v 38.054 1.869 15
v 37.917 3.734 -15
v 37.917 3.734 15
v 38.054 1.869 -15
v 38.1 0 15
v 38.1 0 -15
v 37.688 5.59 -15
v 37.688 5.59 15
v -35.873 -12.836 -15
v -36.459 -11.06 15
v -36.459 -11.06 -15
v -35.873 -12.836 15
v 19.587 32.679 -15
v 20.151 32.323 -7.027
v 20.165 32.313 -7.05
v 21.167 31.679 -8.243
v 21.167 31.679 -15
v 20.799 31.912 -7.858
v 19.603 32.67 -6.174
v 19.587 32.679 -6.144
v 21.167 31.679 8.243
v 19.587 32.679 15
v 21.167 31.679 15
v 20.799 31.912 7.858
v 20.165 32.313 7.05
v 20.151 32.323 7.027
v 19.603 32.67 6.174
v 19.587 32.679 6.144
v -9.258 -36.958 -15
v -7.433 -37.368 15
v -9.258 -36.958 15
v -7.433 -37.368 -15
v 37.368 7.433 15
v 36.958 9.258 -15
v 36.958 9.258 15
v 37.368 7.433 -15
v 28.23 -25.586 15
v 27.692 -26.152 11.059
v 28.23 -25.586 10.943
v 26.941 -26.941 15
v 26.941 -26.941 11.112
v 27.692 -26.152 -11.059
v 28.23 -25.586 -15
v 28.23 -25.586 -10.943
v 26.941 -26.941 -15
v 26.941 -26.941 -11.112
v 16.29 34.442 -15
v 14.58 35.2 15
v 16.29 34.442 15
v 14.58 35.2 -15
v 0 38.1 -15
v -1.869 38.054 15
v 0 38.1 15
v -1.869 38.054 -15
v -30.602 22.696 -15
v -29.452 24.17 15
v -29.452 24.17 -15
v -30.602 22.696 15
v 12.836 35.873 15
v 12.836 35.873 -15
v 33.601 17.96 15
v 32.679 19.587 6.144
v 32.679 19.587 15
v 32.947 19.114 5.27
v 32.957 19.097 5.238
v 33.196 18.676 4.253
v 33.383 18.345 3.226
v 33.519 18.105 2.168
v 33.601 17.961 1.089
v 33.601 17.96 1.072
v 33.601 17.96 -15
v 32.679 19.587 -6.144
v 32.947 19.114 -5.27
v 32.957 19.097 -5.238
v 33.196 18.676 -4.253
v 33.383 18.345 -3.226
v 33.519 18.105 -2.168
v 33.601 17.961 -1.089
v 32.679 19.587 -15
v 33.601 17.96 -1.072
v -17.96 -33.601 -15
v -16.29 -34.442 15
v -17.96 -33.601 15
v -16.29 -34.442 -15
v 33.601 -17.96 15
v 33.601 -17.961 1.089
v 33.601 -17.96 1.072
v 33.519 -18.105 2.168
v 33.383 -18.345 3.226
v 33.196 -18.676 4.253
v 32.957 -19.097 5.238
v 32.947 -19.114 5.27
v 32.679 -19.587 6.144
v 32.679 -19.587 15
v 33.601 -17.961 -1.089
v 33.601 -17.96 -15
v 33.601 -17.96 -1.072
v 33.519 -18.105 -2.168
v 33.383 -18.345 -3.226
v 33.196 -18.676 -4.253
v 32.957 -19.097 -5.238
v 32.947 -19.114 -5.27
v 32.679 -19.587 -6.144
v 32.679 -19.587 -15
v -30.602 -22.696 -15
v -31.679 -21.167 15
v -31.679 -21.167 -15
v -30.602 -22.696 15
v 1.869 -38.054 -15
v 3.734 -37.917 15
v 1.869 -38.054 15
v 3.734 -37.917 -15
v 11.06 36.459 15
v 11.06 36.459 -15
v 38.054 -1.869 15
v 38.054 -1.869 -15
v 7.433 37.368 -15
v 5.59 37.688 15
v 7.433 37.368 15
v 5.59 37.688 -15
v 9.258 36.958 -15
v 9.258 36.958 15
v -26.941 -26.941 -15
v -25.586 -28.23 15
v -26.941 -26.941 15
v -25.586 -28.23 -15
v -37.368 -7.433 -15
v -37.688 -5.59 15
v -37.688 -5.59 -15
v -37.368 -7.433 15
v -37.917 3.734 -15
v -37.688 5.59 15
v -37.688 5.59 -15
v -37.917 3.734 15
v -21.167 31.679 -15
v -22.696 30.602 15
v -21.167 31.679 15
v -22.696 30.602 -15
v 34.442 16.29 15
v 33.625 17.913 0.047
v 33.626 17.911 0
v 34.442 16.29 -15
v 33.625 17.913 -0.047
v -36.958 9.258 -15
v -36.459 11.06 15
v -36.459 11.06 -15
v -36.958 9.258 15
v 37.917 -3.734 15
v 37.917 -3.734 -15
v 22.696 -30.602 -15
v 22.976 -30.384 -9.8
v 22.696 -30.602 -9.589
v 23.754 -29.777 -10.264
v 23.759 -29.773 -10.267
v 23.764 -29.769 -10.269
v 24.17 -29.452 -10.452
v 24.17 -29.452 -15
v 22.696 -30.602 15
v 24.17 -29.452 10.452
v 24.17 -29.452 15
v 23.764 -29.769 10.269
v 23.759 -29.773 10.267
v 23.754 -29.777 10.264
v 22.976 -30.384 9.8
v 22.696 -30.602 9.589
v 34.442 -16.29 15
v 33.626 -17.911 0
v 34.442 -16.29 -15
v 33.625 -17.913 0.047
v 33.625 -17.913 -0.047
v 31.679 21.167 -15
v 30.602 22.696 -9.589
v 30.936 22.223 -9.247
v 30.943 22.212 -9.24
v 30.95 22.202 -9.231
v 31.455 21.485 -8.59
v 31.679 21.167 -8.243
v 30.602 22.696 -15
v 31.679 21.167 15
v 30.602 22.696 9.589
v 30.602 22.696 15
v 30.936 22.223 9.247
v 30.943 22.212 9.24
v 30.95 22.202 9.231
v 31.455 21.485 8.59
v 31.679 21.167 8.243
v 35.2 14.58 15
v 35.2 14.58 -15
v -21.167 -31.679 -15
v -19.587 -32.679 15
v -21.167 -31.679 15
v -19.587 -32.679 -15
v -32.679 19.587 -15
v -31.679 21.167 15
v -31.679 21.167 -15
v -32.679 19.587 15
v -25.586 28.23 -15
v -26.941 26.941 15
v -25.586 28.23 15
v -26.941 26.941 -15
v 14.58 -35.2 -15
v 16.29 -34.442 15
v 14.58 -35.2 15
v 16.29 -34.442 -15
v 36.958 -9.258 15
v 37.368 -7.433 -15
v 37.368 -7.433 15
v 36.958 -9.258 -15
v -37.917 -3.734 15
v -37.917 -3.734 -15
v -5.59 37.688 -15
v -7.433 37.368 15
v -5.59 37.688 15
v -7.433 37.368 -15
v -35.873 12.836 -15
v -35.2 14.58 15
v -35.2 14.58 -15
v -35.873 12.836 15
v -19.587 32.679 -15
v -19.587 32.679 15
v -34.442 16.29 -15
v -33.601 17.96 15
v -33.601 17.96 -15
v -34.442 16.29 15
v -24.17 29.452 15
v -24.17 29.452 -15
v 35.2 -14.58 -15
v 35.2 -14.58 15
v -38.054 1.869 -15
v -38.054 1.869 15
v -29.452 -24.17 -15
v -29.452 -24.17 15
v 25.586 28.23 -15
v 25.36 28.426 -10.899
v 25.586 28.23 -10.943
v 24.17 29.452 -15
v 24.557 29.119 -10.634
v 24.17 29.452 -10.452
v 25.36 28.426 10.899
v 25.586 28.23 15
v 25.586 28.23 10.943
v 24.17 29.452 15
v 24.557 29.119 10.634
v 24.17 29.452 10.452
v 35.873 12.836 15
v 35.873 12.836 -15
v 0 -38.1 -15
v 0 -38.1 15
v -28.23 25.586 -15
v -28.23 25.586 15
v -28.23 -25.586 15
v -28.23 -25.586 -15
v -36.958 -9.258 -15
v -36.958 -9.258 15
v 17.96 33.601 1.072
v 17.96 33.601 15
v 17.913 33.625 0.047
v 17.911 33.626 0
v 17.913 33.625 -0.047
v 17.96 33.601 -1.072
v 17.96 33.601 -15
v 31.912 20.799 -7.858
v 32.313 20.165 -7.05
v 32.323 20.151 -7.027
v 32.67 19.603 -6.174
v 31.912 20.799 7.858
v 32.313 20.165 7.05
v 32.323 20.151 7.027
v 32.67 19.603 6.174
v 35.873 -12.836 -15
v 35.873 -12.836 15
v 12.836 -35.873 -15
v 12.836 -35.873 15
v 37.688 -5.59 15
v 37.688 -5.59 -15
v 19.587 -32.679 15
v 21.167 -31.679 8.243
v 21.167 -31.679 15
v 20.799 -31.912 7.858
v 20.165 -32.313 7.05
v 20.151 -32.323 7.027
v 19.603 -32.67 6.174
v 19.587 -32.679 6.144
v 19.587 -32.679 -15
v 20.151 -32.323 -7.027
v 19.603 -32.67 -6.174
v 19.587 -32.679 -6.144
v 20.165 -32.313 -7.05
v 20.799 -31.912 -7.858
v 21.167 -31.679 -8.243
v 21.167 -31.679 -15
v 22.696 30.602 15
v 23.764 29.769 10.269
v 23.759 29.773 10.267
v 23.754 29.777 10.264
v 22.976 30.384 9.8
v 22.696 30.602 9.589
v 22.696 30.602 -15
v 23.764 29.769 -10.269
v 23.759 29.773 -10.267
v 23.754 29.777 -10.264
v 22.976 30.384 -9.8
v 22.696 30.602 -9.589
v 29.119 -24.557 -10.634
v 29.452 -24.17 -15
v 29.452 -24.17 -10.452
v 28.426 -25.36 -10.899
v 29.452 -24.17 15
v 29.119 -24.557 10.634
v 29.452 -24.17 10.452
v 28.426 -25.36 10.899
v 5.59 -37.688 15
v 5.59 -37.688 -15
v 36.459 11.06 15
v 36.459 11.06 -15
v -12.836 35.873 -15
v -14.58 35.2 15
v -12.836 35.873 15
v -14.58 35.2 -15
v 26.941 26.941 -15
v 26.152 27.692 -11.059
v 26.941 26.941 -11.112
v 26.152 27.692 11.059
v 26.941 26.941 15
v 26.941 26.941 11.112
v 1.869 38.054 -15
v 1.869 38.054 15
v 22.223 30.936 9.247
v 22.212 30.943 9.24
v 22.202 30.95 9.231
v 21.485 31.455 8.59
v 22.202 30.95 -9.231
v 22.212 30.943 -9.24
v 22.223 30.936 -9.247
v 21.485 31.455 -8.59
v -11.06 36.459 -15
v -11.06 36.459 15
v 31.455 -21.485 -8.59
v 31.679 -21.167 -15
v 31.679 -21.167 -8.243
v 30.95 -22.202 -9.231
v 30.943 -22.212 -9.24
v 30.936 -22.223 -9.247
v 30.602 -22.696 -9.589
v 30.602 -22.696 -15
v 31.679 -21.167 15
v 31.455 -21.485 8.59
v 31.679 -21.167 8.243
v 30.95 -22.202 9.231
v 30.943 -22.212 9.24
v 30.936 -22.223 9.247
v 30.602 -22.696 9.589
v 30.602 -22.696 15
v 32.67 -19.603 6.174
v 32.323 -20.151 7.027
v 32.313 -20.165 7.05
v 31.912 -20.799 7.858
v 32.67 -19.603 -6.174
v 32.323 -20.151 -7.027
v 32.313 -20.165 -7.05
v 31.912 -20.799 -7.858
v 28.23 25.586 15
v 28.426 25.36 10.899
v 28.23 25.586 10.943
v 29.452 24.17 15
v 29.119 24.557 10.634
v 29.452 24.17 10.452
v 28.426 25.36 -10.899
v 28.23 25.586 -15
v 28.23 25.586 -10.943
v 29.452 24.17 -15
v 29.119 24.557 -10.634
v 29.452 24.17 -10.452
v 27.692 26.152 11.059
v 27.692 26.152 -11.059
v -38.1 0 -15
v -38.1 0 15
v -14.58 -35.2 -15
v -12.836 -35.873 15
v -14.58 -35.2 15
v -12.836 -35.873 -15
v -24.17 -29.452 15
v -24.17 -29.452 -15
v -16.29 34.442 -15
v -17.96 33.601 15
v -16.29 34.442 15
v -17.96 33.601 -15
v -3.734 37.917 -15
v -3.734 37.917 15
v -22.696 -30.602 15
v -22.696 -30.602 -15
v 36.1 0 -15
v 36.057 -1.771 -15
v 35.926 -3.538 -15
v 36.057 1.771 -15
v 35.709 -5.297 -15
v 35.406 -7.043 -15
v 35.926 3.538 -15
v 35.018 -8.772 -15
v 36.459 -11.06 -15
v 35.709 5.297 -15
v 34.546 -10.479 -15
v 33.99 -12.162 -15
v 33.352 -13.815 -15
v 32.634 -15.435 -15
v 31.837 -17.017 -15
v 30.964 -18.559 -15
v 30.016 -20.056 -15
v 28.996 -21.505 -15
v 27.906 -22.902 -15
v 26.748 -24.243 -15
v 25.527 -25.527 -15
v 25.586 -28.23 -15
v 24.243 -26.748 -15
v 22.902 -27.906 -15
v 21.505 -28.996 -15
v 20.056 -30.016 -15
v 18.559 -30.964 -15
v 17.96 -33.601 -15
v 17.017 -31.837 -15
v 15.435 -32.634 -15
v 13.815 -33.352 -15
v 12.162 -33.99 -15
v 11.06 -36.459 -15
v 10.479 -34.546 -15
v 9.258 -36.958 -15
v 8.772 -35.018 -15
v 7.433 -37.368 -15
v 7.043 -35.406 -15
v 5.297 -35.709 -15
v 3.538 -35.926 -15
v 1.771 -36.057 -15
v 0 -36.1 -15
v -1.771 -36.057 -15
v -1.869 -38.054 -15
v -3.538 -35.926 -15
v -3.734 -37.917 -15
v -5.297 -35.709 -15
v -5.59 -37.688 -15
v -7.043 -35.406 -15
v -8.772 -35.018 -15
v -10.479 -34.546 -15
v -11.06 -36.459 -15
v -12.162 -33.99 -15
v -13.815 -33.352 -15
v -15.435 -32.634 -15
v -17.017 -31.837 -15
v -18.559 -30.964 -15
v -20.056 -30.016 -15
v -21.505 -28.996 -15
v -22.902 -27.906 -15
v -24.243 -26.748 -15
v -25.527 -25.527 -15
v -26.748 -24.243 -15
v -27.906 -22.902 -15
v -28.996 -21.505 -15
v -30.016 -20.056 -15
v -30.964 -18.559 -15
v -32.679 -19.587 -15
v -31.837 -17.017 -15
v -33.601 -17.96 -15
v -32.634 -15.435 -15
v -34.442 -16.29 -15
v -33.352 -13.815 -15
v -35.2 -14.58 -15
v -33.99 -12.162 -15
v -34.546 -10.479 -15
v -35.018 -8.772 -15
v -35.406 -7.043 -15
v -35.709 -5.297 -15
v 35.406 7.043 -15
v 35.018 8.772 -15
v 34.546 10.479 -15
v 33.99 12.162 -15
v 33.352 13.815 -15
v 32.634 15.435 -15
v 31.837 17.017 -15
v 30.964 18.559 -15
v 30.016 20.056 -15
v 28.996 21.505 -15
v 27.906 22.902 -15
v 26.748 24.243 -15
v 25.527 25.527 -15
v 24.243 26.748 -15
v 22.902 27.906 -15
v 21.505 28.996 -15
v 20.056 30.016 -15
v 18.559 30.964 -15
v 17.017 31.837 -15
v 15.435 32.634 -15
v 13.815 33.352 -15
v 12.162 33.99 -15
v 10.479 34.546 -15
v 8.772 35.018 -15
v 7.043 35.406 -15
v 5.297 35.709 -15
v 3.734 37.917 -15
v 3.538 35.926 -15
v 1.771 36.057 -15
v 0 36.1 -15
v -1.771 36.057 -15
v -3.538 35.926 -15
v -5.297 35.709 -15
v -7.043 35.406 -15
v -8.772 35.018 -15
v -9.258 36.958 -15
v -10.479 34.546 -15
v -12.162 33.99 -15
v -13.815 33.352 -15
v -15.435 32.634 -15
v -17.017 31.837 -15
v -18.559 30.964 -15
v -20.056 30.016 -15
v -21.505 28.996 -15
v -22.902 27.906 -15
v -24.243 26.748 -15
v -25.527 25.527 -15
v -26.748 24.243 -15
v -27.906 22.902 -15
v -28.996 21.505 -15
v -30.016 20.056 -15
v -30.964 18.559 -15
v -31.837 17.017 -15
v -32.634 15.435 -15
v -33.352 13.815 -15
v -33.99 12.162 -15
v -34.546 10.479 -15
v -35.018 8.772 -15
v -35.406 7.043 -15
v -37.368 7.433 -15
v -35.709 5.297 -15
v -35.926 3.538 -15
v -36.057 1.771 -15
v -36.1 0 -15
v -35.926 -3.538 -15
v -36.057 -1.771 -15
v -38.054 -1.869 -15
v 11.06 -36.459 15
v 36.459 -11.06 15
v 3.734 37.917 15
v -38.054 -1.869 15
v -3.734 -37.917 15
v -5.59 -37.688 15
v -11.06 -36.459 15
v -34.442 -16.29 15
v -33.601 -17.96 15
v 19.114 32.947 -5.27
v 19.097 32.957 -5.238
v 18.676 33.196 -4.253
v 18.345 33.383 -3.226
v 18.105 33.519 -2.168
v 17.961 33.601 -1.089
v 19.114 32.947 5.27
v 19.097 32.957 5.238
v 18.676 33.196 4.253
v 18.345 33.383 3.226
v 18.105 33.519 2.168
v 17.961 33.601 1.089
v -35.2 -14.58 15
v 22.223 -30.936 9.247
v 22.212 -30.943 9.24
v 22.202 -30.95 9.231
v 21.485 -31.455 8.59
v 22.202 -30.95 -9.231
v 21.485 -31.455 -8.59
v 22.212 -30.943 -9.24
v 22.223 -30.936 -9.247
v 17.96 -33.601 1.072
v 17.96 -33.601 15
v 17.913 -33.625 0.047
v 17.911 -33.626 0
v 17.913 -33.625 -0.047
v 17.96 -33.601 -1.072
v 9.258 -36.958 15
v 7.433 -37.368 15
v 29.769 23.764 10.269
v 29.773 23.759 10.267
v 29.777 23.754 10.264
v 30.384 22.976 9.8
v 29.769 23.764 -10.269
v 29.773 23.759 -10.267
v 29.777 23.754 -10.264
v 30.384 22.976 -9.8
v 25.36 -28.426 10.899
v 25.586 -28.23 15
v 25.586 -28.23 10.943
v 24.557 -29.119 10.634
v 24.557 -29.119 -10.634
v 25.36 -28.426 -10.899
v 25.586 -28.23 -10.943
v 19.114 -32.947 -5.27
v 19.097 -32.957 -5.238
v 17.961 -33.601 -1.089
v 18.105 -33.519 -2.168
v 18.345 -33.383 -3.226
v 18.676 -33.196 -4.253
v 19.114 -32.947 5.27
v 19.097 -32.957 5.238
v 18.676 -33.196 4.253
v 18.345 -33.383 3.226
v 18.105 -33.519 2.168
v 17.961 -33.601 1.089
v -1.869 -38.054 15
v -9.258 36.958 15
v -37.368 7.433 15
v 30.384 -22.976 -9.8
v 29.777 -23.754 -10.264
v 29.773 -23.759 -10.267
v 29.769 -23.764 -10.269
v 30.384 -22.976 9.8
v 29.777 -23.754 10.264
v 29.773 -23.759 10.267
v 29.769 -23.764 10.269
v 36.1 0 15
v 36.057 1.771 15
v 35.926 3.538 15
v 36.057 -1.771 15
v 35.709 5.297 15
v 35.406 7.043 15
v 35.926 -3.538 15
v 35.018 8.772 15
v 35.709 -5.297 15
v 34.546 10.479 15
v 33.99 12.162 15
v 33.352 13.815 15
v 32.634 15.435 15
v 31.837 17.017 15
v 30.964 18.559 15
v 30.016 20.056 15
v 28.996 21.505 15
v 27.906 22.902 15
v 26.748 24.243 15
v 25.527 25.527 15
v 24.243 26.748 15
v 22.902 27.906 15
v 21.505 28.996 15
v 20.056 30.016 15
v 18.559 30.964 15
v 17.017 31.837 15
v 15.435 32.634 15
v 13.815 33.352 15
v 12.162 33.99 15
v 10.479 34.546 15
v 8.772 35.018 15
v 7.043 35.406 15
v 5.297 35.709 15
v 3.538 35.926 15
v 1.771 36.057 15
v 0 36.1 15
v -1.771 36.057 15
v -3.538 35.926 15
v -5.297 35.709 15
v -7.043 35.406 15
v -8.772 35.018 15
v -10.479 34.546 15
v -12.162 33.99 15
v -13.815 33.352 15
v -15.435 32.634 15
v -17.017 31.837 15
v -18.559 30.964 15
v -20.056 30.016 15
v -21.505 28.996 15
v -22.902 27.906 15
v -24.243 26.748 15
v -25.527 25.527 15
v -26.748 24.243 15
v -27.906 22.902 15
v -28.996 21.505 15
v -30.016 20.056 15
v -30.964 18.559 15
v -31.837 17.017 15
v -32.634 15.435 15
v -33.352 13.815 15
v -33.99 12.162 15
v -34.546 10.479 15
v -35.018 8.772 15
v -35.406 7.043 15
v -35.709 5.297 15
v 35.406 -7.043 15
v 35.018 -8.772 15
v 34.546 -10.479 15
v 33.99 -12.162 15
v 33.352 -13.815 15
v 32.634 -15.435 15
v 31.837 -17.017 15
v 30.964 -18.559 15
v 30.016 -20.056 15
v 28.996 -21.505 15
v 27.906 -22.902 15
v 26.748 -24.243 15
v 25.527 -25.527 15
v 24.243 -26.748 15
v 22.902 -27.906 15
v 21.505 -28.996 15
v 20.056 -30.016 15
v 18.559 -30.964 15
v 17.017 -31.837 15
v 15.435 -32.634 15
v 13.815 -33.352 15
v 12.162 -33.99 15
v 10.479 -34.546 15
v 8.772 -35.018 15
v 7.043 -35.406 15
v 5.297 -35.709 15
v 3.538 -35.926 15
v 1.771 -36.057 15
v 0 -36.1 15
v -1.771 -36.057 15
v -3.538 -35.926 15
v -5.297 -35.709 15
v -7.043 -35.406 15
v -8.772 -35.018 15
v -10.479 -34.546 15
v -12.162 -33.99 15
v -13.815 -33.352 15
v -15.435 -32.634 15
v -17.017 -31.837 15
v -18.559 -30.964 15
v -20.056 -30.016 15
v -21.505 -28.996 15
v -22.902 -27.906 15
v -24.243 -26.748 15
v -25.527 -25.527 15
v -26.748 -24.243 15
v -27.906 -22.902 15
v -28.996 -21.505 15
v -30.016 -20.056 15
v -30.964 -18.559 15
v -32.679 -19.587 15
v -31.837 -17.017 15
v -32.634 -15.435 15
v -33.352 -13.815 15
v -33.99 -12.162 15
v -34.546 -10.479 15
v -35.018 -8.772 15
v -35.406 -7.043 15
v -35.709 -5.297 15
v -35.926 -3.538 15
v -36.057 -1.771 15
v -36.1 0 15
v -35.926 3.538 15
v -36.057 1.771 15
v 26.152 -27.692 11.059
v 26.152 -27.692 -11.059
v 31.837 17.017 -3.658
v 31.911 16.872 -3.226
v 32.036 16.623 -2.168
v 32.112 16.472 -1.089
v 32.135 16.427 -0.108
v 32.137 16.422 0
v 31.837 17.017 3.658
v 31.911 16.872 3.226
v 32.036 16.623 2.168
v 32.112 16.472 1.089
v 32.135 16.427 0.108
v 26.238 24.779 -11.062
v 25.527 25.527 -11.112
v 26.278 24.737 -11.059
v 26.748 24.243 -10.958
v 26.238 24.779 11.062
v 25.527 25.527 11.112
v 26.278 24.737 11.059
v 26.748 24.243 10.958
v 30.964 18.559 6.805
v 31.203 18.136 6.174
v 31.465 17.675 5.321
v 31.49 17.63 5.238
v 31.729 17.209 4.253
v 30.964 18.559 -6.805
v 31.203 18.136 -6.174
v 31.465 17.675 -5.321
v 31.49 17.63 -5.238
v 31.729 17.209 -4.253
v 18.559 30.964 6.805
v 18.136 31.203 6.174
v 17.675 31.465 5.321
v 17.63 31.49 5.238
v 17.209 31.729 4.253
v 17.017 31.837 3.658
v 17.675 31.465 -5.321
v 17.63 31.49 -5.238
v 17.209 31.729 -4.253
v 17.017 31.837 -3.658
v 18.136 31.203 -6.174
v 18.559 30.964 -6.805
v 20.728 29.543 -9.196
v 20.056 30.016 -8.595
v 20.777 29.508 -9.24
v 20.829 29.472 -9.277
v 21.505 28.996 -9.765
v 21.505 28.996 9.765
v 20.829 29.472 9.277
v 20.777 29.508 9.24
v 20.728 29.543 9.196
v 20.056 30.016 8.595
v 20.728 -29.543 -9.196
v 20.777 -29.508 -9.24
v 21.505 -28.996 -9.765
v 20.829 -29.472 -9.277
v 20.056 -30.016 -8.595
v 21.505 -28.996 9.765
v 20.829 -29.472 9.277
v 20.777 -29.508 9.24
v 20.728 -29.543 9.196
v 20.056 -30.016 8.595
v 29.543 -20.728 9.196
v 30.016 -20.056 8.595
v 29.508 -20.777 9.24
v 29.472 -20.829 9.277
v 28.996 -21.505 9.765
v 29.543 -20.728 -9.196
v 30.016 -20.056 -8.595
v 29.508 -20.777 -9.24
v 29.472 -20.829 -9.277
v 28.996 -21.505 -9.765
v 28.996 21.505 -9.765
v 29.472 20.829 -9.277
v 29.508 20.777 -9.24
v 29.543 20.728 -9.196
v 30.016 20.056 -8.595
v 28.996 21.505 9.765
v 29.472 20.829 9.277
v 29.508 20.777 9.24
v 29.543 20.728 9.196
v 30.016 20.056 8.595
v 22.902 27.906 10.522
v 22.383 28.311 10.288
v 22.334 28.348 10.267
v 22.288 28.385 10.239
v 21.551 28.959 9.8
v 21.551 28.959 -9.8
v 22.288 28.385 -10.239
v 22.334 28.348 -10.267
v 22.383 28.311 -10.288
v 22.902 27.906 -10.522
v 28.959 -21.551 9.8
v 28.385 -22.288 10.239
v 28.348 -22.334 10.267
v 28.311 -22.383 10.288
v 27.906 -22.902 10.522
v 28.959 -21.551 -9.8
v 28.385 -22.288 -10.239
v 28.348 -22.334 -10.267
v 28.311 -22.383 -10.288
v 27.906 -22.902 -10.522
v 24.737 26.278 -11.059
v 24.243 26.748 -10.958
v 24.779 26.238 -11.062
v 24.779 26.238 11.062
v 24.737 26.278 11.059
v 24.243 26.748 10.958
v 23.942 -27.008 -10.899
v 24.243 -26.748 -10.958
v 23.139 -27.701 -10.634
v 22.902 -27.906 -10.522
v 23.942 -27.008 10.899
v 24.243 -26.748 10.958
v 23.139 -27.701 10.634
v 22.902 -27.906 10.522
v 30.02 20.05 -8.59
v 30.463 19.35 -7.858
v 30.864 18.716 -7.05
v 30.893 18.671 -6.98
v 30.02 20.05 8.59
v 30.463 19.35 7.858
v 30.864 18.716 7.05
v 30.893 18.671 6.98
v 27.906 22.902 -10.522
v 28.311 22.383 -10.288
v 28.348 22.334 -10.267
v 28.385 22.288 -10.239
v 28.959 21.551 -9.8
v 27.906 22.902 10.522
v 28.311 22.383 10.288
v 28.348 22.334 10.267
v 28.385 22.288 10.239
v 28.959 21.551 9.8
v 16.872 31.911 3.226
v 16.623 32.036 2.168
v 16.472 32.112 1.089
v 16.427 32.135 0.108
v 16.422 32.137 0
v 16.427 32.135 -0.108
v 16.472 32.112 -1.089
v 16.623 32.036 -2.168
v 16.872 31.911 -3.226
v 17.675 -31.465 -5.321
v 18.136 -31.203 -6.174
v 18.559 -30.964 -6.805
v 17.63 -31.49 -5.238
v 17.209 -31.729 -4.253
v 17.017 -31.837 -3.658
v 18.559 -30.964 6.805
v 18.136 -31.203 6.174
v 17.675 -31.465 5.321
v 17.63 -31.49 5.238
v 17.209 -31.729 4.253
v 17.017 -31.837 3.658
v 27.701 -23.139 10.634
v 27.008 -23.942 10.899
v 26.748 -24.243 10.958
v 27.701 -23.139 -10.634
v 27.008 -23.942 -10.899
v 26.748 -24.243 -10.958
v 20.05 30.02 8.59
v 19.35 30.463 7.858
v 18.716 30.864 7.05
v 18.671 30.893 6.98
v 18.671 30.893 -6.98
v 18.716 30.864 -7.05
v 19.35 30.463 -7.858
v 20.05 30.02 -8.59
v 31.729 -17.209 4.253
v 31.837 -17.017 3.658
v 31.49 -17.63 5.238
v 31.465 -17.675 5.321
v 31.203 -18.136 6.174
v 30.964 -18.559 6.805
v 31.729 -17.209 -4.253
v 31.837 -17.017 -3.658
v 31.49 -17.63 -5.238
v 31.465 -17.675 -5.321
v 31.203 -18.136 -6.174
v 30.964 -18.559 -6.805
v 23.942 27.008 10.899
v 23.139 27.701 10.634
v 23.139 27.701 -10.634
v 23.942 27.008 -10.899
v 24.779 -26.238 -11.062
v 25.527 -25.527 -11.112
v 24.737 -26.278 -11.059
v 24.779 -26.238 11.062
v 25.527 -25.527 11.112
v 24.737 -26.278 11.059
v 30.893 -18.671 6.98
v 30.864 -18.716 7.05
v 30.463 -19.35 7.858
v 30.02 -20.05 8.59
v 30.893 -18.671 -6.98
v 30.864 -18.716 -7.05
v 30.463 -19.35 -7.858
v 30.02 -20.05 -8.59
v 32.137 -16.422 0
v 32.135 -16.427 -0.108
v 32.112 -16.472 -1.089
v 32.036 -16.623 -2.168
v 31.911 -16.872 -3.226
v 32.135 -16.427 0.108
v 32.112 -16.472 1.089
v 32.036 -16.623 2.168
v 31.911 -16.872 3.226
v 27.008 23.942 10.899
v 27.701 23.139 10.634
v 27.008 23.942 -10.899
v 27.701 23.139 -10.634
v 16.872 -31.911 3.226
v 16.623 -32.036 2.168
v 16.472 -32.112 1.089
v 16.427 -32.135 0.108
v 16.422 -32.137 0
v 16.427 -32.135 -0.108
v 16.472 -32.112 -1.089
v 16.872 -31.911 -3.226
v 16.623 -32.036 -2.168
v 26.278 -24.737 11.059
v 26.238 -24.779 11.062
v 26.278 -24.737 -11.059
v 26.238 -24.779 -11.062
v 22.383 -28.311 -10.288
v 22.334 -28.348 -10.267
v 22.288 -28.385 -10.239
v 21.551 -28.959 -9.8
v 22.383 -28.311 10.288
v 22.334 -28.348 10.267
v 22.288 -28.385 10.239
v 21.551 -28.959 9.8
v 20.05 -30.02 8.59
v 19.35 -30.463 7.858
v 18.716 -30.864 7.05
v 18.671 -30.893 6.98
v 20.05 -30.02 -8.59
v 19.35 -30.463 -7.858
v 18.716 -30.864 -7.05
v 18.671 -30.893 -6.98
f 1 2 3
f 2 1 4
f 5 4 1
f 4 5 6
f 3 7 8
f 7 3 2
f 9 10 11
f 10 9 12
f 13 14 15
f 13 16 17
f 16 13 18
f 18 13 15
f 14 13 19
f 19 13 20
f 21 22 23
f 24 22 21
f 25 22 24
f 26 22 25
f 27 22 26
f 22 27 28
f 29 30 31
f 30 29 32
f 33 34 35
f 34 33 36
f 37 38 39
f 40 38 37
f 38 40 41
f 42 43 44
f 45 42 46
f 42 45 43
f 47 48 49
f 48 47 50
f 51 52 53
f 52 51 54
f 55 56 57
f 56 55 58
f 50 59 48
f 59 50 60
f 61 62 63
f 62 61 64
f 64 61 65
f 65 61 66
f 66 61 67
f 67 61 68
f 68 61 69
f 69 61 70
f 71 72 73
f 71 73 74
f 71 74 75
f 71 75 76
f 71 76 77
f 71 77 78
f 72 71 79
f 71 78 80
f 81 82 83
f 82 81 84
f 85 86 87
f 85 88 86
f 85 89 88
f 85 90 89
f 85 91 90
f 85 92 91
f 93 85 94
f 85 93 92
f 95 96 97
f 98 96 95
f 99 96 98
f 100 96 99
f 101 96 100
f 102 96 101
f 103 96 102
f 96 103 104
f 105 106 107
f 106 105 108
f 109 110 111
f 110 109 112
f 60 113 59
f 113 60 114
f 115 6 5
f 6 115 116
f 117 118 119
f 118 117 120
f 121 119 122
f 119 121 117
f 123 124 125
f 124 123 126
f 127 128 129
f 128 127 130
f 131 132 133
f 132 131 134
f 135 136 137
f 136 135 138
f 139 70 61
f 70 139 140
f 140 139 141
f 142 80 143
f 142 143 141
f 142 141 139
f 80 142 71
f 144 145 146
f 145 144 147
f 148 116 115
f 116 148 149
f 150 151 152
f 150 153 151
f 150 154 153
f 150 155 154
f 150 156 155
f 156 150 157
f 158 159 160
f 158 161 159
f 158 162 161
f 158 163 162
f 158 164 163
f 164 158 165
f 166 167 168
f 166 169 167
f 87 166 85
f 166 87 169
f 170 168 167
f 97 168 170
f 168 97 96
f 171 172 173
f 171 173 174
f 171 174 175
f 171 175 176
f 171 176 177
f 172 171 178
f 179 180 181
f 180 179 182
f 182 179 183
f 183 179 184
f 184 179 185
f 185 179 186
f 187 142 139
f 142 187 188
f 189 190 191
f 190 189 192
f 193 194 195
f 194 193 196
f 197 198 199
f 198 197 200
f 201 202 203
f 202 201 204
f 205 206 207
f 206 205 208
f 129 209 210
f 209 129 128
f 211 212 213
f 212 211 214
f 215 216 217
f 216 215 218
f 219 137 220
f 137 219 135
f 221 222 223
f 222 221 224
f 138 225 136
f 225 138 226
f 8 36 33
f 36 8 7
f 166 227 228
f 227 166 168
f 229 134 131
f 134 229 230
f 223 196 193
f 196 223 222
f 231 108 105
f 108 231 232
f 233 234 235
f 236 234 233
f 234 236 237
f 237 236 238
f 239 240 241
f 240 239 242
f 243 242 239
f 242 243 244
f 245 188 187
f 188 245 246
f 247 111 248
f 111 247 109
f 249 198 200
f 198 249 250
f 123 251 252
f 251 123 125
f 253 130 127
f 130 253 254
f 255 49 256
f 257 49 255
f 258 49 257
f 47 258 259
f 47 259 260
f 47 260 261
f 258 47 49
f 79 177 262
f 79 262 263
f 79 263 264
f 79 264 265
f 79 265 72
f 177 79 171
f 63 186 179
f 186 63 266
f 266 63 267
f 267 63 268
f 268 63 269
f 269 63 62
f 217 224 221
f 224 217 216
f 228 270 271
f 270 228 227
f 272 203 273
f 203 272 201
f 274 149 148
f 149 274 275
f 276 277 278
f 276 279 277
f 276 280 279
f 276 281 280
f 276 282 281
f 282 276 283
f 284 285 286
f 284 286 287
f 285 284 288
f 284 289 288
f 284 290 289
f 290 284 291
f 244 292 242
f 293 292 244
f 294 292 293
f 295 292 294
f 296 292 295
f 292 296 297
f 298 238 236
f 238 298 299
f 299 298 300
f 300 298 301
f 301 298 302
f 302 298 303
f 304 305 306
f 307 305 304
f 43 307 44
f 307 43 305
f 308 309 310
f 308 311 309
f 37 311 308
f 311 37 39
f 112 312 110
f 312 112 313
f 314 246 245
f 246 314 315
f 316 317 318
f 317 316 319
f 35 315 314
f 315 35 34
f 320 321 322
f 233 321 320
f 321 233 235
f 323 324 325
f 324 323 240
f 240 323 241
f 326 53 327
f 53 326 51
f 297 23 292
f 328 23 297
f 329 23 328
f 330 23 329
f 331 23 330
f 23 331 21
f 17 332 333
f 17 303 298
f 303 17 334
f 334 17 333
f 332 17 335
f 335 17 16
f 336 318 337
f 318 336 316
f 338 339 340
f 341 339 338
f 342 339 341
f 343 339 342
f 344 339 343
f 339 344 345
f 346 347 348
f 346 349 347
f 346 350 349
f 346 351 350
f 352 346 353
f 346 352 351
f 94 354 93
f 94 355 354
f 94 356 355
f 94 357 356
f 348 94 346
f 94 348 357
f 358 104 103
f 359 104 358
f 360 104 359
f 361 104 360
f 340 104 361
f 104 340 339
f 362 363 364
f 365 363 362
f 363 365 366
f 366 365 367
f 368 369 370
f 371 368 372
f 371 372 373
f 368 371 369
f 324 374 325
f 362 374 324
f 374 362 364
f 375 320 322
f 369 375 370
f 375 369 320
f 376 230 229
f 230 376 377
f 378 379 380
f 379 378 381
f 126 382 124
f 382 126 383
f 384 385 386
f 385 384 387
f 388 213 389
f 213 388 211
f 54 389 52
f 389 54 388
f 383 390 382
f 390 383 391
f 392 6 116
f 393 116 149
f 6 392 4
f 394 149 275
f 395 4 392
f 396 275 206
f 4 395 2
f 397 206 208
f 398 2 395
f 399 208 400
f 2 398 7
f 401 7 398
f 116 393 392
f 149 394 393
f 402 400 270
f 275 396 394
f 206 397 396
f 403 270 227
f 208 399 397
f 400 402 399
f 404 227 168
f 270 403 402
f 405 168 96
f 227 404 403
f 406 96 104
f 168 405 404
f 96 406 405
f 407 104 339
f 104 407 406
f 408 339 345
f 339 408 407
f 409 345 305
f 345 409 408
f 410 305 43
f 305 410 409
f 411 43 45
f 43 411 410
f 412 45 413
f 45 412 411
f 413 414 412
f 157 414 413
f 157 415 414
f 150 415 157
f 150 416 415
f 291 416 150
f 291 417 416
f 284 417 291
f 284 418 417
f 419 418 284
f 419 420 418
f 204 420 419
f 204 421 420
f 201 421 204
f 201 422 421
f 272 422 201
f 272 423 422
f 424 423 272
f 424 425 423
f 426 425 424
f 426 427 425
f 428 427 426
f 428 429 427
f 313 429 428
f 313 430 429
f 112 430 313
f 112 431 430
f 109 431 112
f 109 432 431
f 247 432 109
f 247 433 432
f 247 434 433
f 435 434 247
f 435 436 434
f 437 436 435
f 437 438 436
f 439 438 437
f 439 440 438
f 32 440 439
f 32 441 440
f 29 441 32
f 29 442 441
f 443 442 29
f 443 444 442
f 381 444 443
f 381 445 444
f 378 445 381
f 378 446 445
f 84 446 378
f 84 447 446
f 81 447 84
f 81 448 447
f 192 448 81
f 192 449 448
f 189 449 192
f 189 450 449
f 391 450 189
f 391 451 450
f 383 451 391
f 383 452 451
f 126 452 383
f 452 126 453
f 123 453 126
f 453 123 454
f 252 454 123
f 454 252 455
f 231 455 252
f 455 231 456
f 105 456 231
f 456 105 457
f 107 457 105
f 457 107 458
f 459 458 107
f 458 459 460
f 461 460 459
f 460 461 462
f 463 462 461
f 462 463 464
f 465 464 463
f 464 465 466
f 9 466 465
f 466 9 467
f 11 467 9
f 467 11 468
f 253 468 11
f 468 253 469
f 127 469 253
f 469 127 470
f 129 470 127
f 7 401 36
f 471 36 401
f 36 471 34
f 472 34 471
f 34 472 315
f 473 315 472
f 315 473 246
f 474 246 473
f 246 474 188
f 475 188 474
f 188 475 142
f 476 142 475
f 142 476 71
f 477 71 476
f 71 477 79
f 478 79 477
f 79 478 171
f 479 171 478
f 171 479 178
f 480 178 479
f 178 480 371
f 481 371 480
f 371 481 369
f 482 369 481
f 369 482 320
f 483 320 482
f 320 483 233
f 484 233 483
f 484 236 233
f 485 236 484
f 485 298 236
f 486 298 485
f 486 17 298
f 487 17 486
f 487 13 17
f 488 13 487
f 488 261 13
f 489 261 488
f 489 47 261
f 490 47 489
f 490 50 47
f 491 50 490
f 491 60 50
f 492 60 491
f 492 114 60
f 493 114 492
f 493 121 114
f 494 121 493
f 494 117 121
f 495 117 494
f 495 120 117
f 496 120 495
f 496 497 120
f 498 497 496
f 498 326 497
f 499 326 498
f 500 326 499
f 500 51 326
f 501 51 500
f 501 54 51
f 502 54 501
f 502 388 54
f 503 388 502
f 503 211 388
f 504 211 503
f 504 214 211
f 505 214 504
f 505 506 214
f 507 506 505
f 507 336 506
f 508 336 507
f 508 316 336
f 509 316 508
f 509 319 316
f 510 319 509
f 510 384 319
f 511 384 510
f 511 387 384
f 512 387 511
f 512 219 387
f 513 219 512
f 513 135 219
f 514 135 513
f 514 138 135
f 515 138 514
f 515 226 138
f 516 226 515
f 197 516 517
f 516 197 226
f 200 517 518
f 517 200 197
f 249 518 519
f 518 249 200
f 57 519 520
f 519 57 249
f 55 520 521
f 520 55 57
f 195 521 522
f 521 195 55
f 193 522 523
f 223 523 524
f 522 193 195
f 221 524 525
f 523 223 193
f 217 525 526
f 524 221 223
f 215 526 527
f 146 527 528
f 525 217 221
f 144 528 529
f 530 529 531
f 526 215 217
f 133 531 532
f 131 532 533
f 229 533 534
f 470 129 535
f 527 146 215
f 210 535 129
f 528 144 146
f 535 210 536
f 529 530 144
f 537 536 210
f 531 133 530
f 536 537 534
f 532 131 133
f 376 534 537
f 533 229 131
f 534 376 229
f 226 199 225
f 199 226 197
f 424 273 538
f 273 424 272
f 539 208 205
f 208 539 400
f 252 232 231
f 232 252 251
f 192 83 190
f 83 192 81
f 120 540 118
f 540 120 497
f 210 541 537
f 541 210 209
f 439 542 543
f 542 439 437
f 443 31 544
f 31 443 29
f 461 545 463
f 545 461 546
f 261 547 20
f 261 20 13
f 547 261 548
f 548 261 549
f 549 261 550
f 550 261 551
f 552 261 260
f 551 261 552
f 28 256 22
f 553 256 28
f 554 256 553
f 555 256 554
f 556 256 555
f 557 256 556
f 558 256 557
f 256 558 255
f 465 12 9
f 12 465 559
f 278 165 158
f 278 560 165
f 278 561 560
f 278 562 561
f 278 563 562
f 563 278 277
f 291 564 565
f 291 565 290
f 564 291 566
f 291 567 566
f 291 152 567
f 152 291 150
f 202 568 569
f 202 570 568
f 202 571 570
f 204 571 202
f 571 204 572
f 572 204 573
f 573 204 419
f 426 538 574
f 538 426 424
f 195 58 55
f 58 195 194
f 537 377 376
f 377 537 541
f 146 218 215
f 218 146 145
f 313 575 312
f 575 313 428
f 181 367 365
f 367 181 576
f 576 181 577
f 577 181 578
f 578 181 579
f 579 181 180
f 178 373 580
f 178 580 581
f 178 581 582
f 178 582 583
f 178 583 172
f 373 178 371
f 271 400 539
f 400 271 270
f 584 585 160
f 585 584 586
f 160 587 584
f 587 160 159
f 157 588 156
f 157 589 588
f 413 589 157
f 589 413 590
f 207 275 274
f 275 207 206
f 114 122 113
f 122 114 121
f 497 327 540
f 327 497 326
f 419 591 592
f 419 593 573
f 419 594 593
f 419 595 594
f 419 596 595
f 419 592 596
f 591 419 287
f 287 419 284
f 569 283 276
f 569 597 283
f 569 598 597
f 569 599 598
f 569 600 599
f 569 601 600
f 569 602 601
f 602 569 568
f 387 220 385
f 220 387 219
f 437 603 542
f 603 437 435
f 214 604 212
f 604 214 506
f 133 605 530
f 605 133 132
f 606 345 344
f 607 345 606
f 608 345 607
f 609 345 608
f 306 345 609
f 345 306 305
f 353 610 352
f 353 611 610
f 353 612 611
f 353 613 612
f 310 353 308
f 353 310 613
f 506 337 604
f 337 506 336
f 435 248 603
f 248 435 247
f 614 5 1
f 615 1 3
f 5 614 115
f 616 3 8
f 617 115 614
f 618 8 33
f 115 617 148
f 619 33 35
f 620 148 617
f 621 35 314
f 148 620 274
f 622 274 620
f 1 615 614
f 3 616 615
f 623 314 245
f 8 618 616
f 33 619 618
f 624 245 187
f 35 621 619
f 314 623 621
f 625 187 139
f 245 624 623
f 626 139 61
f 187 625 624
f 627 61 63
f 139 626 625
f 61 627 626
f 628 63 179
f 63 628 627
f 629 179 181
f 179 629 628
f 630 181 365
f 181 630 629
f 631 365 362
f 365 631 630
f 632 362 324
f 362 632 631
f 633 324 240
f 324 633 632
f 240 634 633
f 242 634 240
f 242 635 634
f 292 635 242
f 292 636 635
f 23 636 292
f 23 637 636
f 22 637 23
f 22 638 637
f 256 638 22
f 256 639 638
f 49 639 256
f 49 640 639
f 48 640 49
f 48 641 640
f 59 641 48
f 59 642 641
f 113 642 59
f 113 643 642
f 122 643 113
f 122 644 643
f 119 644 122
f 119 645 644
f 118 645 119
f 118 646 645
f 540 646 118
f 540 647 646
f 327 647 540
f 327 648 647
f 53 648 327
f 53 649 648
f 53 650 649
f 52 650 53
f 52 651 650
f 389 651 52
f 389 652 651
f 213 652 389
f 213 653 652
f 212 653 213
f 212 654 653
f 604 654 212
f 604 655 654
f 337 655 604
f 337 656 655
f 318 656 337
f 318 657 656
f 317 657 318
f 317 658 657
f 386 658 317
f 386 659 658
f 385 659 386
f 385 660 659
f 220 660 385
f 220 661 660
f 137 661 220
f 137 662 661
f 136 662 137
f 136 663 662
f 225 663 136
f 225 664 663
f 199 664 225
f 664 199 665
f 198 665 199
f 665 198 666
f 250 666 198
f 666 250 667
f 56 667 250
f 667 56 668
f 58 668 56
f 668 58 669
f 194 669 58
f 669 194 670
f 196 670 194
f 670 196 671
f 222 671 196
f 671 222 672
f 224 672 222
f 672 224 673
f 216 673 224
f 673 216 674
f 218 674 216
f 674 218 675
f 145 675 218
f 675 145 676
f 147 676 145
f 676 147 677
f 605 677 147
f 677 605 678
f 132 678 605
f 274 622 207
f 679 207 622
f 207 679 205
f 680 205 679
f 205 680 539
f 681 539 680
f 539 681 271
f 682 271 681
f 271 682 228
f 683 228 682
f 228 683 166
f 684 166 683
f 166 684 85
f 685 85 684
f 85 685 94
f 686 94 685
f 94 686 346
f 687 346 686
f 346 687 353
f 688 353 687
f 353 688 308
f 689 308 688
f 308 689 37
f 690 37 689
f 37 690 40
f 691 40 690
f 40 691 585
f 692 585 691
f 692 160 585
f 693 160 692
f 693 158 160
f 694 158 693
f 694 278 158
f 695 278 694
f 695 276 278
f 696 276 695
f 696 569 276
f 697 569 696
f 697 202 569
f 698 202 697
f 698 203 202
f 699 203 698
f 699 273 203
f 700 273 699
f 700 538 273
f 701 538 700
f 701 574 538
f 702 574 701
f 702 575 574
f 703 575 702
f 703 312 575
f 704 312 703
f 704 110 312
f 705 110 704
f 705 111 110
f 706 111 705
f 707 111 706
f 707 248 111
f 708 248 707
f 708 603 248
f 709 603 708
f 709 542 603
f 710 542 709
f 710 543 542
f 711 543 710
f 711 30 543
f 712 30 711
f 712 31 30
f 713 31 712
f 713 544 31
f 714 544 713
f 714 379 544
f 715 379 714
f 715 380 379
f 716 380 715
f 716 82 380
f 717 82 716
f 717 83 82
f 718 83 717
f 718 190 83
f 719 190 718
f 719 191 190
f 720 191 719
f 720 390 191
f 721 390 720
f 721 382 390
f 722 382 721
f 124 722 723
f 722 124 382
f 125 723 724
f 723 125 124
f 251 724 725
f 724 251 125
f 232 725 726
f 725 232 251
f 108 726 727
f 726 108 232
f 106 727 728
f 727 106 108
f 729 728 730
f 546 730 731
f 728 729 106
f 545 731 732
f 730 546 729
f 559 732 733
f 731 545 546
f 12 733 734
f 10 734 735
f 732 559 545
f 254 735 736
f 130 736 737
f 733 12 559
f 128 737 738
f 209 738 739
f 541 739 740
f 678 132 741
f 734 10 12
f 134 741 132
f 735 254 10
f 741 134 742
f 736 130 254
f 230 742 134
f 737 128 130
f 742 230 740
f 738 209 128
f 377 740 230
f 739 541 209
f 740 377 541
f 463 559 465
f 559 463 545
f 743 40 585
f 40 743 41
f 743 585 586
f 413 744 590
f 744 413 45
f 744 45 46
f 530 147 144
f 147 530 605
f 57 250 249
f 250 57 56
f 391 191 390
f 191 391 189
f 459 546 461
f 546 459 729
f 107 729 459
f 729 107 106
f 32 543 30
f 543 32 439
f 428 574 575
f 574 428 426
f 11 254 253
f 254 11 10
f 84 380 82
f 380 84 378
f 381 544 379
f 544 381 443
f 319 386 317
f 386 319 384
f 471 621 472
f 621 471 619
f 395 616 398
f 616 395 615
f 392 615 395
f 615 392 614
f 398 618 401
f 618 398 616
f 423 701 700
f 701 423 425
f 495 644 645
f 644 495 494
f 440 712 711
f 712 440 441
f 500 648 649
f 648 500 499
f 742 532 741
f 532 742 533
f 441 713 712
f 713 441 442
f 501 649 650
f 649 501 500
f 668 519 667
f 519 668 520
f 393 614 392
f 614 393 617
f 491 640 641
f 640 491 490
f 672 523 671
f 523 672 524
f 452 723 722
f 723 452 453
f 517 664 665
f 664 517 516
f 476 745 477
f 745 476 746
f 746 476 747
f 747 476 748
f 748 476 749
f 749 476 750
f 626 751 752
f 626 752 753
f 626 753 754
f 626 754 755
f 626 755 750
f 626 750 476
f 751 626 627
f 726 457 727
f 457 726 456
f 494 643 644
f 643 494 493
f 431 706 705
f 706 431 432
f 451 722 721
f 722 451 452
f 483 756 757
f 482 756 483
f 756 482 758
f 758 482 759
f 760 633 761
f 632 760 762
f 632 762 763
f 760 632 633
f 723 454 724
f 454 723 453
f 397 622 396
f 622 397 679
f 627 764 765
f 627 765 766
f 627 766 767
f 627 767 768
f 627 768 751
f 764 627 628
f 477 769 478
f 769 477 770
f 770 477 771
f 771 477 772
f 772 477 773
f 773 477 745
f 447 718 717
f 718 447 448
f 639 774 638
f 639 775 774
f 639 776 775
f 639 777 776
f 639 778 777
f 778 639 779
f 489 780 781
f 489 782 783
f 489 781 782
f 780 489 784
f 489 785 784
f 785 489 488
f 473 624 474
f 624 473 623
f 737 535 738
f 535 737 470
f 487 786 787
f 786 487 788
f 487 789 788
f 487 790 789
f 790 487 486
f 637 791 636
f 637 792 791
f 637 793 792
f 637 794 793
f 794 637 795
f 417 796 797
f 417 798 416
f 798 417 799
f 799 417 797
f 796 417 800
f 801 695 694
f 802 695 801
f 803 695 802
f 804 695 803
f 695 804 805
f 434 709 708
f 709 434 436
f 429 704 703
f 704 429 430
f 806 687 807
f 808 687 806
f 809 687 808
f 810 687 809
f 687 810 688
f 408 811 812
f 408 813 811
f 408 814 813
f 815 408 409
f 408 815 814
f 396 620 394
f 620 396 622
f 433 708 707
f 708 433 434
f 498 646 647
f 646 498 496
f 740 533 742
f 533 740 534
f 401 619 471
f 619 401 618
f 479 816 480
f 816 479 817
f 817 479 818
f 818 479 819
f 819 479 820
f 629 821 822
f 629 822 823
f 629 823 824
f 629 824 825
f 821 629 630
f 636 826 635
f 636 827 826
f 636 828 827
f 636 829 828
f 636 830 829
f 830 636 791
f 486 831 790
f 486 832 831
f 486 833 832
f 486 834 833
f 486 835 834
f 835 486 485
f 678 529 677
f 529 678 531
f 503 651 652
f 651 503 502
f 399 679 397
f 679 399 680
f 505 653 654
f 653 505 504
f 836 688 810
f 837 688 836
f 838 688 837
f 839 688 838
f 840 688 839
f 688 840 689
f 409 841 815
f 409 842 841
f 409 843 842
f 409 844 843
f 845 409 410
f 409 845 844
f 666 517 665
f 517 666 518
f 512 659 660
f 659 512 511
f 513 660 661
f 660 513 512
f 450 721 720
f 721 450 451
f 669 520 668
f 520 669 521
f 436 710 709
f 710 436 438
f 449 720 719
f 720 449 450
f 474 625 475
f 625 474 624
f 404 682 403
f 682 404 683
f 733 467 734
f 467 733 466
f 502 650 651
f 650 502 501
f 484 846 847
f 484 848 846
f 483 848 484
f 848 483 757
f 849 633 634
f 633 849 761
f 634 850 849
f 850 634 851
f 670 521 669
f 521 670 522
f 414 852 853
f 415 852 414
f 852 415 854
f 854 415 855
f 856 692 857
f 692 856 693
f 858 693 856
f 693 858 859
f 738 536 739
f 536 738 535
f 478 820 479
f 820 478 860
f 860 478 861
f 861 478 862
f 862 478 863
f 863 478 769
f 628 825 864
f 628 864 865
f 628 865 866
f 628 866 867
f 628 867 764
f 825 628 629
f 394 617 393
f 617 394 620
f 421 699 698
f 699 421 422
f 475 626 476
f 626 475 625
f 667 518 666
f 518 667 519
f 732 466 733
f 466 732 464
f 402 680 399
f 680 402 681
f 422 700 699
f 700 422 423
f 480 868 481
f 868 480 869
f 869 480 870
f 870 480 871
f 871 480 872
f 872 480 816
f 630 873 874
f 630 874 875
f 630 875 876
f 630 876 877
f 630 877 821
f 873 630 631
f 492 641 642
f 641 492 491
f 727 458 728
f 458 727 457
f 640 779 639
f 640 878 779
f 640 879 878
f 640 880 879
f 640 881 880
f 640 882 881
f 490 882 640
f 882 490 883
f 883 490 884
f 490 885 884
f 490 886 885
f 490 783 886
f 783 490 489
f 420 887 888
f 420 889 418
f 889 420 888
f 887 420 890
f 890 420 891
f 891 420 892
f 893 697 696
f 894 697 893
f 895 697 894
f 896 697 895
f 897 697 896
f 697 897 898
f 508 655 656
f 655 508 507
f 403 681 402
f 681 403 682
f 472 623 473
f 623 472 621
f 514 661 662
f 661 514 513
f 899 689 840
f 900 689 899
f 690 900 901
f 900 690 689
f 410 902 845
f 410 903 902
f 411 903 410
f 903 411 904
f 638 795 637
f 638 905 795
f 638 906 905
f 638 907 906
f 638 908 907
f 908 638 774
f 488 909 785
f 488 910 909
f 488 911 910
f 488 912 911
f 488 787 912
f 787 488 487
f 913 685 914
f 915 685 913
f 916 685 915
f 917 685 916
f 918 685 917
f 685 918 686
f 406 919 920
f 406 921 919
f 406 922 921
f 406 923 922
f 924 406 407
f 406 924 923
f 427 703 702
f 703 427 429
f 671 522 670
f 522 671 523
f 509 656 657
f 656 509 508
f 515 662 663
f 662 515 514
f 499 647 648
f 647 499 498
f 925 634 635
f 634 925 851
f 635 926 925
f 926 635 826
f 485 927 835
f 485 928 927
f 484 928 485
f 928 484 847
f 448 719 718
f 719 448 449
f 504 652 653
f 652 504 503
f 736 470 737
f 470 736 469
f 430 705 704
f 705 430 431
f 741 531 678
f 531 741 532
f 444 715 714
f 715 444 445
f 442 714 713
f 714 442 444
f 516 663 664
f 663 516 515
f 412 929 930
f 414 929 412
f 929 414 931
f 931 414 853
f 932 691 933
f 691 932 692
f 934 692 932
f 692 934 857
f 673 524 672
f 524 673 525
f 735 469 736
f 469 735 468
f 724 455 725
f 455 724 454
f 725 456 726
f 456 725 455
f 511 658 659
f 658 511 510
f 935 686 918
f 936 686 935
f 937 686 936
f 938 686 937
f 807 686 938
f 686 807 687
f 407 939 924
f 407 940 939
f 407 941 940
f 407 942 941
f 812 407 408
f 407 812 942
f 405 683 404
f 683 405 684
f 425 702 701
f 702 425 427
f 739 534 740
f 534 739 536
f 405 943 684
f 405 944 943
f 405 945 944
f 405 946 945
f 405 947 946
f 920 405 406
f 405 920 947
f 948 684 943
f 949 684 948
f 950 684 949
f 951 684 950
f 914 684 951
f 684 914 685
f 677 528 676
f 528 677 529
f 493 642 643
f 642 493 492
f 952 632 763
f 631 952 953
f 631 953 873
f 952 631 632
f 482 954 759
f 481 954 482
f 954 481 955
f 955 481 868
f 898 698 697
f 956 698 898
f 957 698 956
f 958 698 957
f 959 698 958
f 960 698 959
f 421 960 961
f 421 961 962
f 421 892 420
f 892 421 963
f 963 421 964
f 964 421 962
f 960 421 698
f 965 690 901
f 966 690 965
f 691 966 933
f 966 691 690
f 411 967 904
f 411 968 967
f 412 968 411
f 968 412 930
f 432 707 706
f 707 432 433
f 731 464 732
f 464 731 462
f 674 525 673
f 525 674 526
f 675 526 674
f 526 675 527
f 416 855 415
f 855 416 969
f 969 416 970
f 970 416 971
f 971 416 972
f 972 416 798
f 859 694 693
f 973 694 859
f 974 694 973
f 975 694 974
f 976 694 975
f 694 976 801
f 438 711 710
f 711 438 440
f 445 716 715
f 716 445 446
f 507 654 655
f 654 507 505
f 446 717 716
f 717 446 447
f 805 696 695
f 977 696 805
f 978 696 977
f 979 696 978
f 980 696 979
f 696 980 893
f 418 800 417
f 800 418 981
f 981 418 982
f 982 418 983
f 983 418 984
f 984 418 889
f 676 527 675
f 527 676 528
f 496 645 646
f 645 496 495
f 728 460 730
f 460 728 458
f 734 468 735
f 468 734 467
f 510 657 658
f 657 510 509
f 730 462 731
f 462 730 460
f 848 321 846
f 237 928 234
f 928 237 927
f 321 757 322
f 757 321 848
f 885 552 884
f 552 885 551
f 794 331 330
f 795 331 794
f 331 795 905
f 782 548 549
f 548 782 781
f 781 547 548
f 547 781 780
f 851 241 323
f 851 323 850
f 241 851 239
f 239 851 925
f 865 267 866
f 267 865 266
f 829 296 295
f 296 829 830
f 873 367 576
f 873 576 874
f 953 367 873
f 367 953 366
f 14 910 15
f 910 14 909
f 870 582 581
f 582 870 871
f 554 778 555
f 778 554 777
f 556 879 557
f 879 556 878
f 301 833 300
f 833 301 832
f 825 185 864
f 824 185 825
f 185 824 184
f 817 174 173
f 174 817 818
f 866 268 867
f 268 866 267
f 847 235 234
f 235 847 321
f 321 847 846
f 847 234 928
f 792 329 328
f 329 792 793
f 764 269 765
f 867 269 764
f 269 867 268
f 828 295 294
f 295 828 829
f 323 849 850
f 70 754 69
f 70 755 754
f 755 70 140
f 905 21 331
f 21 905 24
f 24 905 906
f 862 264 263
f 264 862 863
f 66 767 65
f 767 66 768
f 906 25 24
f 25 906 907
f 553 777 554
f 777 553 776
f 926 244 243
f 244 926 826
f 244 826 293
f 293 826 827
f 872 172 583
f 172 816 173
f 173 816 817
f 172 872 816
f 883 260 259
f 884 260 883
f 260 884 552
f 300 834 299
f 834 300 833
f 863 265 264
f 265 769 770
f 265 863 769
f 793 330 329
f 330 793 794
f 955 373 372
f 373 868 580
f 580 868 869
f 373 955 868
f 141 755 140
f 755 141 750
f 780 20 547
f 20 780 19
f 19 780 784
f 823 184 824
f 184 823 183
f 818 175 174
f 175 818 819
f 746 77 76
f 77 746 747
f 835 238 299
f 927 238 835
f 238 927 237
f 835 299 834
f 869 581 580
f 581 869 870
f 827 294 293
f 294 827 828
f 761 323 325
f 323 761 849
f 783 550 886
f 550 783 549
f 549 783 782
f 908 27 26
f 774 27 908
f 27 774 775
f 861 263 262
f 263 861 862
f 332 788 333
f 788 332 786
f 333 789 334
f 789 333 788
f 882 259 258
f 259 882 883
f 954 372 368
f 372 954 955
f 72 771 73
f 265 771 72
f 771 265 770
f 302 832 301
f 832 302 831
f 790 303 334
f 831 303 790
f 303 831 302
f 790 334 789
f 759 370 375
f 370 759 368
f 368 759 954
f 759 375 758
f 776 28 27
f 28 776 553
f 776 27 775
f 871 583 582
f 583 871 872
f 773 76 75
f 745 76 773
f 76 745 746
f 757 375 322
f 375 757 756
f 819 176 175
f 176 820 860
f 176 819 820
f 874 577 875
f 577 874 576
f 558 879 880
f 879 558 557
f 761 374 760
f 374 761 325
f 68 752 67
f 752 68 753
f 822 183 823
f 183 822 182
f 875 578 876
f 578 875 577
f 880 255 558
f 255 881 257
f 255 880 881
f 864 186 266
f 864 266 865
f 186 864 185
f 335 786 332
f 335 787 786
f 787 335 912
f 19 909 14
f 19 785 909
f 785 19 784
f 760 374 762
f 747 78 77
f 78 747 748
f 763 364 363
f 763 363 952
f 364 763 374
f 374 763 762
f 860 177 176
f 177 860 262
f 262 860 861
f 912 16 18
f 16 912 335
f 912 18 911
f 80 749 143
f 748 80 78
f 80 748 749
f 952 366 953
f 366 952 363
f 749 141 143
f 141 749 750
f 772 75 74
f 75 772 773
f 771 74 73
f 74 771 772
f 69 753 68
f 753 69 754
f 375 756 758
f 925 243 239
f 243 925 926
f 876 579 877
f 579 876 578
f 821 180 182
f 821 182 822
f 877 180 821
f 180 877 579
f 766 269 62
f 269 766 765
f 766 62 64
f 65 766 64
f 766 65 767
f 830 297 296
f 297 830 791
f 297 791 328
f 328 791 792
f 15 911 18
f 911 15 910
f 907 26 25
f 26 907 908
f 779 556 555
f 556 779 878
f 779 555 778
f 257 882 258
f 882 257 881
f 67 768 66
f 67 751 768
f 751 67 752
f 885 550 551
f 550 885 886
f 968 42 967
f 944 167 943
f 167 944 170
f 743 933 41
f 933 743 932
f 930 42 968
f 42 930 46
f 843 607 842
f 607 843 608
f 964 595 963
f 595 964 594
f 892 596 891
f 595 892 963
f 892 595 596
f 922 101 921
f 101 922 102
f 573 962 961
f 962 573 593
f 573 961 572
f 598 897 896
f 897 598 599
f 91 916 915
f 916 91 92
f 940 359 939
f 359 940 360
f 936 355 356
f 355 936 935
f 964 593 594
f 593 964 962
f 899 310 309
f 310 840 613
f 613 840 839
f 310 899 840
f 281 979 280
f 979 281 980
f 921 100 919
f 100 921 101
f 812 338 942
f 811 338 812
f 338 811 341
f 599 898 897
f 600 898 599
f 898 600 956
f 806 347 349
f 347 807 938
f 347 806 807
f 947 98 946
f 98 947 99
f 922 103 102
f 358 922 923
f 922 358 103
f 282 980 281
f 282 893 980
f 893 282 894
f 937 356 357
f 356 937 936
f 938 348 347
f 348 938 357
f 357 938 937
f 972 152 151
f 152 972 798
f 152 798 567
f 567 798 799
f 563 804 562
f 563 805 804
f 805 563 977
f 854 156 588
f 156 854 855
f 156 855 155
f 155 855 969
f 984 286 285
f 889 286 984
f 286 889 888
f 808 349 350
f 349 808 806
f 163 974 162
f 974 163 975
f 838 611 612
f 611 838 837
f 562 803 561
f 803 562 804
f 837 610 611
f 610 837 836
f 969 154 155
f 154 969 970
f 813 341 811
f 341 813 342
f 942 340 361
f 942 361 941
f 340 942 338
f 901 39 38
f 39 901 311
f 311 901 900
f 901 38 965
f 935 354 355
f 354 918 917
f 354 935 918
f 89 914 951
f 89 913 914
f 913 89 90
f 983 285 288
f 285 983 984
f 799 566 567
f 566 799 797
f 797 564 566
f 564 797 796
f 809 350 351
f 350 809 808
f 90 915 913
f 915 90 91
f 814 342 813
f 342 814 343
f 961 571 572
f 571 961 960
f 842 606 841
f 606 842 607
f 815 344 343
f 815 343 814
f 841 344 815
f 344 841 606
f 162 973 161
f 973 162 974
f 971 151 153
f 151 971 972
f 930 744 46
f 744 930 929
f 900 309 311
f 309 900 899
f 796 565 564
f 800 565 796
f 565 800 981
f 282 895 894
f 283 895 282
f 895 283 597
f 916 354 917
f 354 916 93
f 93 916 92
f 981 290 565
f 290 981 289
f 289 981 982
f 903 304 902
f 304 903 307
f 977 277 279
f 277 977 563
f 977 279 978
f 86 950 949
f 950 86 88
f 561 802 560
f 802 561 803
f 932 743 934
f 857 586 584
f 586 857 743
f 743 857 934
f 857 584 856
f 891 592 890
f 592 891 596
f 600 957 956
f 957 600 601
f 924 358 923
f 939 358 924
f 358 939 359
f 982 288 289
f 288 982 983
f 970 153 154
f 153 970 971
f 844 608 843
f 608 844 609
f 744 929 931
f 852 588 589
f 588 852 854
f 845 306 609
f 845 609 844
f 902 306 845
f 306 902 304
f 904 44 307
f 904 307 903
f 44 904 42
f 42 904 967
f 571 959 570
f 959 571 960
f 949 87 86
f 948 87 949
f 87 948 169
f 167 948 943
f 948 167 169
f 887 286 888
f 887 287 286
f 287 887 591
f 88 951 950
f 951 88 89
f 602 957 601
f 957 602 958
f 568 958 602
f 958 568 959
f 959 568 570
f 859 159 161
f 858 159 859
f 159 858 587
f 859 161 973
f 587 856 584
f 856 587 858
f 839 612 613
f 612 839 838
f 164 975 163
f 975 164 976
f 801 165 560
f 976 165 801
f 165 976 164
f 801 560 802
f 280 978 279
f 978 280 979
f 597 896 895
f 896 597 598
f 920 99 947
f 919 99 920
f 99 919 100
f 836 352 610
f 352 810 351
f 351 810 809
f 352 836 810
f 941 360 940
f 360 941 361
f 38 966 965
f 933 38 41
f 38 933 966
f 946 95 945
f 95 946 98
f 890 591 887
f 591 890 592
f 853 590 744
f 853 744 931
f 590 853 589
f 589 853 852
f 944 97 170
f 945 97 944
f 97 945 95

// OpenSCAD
shankHole=7/8*25.4;
kegTowerOD=3*25.4;
wallThickness=2;
sectionHeight=30;


difference () {
  cylinder(d=kegTowerOD,h=sectionHeight,center=true, $fn=128);
  cylinder(d=kegTowerOD-2*wallThickness, h=sectionHeight,center=true, $fn=128);
  rotate([0,90,45])cylinder(d=shankHole,h=kegTowerOD/2, $fn=64);
  rotate([0,90,-45])cylinder(d=shankHole,h=kegTowerOD/2, $fn=64);

  
}
